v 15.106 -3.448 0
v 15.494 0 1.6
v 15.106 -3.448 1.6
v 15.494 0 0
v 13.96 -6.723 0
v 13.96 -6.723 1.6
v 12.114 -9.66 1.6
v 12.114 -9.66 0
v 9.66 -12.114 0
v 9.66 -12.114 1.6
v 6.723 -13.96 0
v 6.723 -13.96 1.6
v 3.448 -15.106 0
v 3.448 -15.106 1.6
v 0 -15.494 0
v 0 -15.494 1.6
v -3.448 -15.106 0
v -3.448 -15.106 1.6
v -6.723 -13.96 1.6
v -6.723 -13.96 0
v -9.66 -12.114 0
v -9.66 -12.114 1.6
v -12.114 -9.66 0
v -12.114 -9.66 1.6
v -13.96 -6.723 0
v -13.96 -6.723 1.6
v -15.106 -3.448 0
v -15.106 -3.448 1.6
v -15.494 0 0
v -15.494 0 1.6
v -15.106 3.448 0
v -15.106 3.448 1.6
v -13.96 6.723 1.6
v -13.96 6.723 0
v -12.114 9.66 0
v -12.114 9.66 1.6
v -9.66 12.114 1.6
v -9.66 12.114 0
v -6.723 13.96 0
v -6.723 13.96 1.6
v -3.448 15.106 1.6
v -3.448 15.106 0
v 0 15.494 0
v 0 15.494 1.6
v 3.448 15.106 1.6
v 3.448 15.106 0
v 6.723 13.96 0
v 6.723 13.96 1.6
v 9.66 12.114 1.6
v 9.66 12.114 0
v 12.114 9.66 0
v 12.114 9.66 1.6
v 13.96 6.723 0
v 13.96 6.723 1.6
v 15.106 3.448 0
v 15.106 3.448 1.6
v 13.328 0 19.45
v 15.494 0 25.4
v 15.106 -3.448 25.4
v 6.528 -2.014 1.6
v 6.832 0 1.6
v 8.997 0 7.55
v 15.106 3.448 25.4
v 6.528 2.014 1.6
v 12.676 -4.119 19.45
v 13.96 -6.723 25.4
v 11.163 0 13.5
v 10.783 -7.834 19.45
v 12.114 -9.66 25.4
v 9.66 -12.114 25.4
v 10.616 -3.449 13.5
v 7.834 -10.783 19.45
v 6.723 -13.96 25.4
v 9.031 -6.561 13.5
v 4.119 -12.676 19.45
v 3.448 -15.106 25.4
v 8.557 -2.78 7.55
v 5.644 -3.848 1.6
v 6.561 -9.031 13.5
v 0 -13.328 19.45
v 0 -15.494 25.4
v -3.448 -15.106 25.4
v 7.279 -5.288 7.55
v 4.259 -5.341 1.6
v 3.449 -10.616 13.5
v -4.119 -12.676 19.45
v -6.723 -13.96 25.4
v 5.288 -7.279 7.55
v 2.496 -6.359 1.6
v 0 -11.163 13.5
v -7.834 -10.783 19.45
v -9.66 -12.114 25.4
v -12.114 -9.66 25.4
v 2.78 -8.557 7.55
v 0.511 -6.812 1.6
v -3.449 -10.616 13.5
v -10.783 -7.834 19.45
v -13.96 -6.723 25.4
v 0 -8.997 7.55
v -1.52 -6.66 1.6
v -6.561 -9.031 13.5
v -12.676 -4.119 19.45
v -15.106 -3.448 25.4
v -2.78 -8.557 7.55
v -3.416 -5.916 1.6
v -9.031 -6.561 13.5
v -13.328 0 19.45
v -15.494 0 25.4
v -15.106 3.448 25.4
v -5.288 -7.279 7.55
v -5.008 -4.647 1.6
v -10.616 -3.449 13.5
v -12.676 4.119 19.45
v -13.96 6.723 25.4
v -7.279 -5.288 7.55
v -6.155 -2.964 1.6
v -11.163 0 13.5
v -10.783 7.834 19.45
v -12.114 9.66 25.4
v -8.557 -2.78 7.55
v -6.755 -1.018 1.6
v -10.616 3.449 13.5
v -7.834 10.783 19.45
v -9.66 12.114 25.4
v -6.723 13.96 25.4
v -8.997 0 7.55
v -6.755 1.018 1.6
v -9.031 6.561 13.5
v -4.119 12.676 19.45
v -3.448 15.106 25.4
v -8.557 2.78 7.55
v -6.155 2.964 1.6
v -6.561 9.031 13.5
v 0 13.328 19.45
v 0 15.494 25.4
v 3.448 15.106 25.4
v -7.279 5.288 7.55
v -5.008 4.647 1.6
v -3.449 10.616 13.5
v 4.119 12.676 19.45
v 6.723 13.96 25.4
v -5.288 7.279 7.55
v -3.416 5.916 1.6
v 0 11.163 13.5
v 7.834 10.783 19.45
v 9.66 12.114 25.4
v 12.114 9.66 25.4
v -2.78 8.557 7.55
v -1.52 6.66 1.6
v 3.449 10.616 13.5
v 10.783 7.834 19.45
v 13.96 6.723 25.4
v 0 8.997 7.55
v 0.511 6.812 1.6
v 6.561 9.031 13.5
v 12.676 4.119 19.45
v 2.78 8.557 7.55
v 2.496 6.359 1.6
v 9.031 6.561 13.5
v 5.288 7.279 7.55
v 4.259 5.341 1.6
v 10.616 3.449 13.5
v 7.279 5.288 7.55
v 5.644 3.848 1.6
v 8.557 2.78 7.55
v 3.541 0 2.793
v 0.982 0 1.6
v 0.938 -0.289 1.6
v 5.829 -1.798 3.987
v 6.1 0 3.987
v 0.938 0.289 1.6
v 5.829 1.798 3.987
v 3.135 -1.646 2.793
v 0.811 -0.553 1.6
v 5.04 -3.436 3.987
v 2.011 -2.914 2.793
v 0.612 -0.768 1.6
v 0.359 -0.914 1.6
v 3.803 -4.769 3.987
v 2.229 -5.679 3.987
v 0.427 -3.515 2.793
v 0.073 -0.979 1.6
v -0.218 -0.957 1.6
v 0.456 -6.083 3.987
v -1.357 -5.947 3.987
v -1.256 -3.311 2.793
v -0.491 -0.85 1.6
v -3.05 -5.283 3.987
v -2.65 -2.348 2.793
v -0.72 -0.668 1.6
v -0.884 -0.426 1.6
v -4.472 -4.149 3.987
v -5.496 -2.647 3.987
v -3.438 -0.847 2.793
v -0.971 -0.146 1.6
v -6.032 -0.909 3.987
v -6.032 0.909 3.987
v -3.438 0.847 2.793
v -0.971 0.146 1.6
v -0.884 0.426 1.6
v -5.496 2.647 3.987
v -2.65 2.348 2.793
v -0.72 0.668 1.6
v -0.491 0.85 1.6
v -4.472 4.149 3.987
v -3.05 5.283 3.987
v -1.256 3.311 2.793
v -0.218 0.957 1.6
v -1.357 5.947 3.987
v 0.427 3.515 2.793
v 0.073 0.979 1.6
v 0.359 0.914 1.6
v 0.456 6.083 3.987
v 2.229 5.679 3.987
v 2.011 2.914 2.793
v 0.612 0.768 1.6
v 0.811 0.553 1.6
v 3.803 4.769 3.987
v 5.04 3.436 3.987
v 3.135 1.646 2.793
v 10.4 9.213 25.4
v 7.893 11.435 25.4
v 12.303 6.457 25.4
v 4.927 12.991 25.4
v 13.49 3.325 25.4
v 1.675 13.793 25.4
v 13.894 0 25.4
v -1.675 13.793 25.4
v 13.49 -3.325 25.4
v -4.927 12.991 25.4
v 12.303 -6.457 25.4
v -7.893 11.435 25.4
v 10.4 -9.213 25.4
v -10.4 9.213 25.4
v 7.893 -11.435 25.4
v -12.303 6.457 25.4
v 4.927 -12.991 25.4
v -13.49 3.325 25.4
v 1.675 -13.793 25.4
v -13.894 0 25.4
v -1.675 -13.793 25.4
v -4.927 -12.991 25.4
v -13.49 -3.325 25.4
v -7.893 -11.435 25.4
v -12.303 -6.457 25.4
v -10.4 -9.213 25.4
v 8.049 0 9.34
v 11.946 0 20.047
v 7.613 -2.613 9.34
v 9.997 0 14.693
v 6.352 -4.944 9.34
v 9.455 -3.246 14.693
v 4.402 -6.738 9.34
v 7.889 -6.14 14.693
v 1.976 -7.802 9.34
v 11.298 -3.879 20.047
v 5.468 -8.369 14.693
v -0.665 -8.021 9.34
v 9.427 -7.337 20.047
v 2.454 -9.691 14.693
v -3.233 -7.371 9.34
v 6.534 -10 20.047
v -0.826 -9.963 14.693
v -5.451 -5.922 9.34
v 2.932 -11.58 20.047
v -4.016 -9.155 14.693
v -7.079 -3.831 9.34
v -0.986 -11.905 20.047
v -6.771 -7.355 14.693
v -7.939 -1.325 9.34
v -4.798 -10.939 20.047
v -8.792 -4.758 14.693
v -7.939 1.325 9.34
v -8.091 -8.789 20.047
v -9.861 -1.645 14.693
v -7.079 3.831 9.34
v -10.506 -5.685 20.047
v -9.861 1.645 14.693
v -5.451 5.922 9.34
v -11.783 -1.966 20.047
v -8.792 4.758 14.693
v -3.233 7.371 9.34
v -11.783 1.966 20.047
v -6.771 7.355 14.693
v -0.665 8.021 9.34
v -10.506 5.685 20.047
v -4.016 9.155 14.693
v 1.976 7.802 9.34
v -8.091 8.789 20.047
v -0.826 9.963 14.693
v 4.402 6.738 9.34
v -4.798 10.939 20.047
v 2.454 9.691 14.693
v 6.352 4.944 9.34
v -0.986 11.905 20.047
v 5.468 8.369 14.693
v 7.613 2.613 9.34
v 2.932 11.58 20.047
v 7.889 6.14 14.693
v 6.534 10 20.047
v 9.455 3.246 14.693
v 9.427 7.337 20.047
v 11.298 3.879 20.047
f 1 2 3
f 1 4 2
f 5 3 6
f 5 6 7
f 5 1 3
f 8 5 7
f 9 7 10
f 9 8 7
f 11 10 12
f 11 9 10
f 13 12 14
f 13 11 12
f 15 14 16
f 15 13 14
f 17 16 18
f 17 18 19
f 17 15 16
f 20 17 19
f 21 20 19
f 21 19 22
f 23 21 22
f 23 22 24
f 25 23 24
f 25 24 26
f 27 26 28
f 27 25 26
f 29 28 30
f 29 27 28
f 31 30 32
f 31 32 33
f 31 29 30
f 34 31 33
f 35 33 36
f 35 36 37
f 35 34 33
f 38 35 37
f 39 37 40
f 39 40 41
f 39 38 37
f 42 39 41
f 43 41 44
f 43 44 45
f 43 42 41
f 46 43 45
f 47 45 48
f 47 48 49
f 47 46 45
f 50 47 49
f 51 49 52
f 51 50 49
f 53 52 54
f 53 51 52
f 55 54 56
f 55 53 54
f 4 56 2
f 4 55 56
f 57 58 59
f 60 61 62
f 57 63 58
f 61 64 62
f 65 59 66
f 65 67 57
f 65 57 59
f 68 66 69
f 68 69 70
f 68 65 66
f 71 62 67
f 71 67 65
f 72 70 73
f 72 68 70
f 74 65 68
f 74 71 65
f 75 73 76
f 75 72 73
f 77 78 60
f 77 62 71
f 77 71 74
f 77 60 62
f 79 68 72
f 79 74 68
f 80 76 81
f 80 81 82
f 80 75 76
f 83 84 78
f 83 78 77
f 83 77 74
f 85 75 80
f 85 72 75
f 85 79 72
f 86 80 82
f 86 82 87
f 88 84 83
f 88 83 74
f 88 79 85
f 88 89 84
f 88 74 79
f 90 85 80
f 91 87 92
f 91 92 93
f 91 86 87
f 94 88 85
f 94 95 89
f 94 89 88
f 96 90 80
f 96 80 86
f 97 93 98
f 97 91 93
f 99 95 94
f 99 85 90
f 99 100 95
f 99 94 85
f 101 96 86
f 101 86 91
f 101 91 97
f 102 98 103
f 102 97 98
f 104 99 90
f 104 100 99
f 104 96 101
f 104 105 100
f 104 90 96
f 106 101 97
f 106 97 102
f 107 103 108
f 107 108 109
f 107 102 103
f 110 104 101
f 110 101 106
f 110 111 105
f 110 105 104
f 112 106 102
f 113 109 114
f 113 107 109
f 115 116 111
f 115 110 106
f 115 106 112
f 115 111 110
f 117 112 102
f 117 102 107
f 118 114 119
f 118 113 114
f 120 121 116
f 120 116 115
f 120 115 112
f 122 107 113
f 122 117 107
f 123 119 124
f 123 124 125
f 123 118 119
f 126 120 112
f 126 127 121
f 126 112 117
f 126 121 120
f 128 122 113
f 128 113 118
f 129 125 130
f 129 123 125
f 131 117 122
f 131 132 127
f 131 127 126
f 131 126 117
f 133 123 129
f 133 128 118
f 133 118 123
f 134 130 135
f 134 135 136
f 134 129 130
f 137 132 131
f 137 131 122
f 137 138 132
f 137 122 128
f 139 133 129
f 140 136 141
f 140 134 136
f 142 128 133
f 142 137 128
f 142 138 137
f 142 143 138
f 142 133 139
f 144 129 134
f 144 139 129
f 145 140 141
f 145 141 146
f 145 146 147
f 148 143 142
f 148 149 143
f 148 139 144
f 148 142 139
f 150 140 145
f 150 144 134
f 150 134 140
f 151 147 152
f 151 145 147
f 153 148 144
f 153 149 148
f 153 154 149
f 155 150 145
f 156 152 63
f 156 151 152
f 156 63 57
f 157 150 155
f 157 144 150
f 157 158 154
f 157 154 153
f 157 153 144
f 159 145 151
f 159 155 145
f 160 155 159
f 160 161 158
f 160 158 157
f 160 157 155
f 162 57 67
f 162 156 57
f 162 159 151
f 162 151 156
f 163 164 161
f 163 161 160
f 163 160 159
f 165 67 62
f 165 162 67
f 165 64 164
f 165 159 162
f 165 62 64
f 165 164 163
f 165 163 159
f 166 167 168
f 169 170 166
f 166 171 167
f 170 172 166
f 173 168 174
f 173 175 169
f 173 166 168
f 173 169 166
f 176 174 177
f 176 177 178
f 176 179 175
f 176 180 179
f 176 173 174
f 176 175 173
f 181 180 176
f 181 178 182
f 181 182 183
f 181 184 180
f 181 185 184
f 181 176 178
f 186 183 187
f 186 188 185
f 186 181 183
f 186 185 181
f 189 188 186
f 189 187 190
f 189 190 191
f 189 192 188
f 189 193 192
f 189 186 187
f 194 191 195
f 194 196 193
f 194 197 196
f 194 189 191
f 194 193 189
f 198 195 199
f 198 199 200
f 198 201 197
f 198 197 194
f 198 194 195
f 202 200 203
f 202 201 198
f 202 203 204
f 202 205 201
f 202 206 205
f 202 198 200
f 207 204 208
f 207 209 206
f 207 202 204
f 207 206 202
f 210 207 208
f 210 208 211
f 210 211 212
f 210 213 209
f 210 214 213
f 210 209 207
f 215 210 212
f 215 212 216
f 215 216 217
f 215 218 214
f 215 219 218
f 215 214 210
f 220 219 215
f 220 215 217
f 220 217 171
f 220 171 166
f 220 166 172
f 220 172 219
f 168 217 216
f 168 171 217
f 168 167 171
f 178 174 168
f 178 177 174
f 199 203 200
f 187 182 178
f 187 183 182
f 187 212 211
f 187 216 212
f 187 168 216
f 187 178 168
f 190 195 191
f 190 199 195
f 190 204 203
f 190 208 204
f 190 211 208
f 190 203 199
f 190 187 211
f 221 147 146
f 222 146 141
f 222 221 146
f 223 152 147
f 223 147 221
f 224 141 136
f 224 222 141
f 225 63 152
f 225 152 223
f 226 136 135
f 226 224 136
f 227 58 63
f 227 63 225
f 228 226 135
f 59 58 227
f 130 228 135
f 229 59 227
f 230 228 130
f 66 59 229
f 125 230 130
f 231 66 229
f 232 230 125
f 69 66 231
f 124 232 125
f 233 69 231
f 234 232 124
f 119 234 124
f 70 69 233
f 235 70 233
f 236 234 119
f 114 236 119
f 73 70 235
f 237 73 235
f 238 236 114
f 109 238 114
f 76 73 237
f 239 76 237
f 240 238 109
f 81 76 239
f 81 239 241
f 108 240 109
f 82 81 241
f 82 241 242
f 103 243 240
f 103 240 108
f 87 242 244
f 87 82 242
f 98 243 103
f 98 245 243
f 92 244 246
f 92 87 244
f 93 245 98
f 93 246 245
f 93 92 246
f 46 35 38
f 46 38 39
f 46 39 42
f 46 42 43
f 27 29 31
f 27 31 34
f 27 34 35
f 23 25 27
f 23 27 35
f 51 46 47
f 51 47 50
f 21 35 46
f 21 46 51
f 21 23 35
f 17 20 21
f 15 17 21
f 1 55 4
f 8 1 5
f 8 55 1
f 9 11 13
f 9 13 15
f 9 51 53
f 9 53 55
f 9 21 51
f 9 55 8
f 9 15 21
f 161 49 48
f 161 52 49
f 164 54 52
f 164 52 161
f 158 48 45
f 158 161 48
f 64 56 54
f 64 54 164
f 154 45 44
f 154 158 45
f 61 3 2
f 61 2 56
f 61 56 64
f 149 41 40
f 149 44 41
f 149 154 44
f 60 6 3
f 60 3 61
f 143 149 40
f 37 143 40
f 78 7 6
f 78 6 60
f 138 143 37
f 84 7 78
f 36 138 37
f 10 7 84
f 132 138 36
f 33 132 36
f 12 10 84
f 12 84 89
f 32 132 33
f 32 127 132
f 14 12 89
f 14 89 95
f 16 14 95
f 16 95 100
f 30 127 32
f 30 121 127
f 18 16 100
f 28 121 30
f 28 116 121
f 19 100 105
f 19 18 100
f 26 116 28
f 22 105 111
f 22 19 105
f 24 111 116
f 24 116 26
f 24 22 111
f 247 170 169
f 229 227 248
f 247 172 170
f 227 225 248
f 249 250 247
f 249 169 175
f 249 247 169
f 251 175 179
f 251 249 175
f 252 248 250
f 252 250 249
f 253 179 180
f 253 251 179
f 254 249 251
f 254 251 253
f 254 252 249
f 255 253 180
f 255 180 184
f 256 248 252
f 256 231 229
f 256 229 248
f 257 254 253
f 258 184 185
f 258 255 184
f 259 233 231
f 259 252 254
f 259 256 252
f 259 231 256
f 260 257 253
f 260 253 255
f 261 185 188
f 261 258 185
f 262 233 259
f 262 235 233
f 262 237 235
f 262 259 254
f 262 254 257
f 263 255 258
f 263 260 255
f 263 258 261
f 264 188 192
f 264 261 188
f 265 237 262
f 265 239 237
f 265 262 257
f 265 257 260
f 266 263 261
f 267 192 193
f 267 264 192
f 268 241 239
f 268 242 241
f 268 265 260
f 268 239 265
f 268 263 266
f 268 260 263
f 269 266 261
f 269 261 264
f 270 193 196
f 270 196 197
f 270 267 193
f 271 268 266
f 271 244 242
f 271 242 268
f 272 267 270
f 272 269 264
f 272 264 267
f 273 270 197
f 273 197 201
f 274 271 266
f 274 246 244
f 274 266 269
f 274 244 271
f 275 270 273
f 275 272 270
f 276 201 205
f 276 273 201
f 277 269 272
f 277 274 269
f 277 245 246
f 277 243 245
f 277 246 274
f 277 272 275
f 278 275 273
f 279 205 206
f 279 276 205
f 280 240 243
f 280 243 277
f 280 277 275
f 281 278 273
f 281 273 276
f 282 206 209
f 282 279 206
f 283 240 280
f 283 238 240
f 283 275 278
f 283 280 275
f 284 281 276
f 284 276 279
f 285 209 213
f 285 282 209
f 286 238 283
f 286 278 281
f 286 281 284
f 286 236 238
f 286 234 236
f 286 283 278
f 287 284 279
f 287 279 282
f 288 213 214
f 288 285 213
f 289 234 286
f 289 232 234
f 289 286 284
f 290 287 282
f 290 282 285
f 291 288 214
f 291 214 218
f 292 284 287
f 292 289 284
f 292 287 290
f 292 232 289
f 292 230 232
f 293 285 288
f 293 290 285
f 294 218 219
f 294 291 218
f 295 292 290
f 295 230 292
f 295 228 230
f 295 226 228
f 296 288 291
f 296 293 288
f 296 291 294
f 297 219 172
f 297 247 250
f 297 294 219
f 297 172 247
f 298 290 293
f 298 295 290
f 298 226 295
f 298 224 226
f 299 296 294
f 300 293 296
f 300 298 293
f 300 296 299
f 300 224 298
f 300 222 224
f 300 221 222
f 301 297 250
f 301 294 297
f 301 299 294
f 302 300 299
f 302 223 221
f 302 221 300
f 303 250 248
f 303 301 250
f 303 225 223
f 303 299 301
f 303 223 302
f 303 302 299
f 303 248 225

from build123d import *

# Parameters (mm, degrees)
CHAMFER1_SIZE  = 4.24981925
CHAMFER1_SIZE2 = 2.54


with BuildPart() as part:
    # Sketch1 → Revolve2 (revolve)
    with BuildSketch(Plane(origin=(0, 0, 0), x_dir=(0, 0, -1), z_dir=(1, 0, 0)), mode=Mode.PRIVATE) as revolve2_sk:
        Polygon((-1.6, 0), (-1.6, 5.231508424), (-25.4, 13.894), (-25.4, 15.494), (-1.6, 6.831508424), (-1.6, 15.494), (0, 15.494), (0, 0), align=None)
    revolve(revolve2_sk.sketch.rotate(Axis((0, 0, 1.6), (0, 0, -1)), 90), axis=Axis((0, 0, 1.6), (0, 0, -1)))  # turned: the seam where the file's is

    # Chamfer1
    chamfer1_edges = [part.edges().sort_by_distance(p)[0] for p in [
        (-5.231508424, 0, 1.6),
    ]]
    chamfer1_side = [part.faces().sort_by_distance(p)[0] for p in [
        (0, 0, 1.6),
    ]]
    chamfer(chamfer1_edges, length=CHAMFER1_SIZE, length2=CHAMFER1_SIZE2, reference=chamfer1_side[0])


solid = part.part
